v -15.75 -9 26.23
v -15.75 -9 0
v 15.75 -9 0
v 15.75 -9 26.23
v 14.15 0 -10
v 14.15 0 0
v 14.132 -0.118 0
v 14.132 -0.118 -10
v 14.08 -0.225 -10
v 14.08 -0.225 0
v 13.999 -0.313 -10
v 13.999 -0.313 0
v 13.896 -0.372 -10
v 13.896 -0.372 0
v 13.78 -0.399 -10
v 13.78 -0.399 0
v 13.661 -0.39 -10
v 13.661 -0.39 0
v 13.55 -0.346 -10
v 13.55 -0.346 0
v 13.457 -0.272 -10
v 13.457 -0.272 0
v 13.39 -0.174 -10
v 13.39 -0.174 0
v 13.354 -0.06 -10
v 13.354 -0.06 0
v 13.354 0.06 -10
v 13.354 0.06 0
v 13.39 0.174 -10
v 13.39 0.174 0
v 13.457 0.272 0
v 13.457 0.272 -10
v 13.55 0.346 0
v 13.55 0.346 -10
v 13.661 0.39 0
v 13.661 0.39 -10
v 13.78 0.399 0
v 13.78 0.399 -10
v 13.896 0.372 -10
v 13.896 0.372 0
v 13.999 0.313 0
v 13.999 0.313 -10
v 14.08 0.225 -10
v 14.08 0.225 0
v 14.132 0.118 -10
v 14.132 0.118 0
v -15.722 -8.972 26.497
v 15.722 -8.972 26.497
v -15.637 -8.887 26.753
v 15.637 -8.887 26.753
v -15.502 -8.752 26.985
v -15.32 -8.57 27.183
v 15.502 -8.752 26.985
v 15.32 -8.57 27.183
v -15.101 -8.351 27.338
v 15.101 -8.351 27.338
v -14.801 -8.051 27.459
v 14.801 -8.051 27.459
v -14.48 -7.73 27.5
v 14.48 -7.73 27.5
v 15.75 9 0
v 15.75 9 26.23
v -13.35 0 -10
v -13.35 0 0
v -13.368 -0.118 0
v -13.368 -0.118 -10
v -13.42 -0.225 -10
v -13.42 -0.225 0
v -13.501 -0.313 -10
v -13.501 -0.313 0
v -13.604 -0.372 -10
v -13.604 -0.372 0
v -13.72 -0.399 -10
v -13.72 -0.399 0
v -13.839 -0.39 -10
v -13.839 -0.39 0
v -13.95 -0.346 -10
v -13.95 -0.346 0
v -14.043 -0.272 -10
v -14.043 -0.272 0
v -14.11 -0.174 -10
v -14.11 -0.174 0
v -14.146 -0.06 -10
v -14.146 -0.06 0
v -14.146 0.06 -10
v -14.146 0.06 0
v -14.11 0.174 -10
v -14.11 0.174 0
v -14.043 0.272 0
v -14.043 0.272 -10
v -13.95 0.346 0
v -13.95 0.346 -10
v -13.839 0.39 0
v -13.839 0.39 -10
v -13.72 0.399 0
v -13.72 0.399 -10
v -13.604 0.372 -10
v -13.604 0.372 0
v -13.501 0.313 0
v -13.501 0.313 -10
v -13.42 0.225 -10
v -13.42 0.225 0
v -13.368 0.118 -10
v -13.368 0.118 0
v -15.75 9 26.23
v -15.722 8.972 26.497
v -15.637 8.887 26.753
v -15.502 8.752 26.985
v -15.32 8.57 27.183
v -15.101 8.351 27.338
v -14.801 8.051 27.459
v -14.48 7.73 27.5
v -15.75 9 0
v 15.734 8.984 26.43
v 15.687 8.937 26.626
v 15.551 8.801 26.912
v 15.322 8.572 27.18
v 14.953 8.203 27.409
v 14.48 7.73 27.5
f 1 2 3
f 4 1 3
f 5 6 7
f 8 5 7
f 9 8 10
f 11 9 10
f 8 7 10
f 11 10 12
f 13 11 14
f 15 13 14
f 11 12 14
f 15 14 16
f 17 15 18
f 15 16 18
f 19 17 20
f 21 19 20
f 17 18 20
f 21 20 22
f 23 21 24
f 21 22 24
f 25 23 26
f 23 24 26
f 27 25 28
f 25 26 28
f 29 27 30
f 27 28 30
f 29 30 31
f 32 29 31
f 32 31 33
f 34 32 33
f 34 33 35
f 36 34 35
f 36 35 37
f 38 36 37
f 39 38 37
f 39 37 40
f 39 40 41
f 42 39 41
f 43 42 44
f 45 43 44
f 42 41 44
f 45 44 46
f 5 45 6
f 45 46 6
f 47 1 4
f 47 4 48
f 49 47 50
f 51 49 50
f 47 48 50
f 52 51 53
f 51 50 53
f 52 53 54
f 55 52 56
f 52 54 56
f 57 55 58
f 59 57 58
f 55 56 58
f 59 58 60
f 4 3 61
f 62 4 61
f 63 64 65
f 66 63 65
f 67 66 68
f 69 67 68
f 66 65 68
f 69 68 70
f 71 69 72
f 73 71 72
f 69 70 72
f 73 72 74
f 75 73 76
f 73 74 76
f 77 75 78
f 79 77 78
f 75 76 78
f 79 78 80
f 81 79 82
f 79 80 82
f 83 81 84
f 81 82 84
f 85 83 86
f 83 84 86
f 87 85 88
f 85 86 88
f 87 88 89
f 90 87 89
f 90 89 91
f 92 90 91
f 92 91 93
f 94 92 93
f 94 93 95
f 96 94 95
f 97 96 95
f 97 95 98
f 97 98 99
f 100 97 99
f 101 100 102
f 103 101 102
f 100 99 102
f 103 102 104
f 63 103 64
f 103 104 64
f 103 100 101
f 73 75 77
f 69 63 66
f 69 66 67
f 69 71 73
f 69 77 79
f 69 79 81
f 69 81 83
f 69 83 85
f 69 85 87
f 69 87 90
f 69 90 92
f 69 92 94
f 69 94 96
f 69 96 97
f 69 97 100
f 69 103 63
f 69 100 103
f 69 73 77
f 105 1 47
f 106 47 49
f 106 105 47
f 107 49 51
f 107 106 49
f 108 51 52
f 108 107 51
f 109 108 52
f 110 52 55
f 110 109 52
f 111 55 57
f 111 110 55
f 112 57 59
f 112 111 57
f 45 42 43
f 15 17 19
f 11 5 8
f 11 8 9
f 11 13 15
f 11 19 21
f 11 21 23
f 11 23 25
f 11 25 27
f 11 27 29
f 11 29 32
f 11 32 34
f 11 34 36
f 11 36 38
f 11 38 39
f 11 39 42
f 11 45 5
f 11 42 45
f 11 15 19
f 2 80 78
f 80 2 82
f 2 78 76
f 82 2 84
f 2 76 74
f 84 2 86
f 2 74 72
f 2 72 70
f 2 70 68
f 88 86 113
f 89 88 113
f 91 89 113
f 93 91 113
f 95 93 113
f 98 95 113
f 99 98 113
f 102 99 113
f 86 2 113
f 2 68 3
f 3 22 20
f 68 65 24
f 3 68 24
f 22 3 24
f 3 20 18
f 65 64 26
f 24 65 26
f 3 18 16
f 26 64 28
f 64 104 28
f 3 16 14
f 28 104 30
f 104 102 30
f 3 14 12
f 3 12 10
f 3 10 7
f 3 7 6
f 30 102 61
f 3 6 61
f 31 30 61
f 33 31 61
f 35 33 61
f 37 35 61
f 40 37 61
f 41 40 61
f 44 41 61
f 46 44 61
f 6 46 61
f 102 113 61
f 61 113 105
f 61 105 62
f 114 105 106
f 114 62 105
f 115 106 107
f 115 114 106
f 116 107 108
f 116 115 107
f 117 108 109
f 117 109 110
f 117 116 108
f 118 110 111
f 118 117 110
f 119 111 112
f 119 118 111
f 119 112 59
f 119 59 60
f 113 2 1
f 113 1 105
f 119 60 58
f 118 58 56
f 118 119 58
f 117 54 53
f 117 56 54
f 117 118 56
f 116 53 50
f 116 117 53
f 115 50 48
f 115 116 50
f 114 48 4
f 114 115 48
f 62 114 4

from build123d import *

# Parameters (mm, degrees)
F0_W     = 31.5
F0_H     = 18
F0_R     = 0.4
F1_DEPTH = 27.5
F2_R     = 0.4
F3_DEPTH = 10
F4_R     = 1.27


with BuildPart() as f1:
    # F0 (on Top) → F1 (new body)
    with BuildSketch(Plane.XY):
        Rectangle(F0_W, F0_H)
        with Locations((-13.75, 0)):
            Circle(F0_R, mode=Mode.SUBTRACT)
        with Locations((13.75, 0)):
            Circle(F0_R, mode=Mode.SUBTRACT)
        with Locations((13.75, 0)):
            Circle(F0_R)
        with Locations((-13.75, 0)):
            Circle(F0_R)
    extrude(amount=F1_DEPTH)

    # F2 (on face) → F3 (join)
    with BuildSketch(Plane(origin=(0, 0, 0), x_dir=(1, 0, 0), z_dir=(0, 0, -1))):
        with Locations((13.75, 0)):
            Circle(F2_R)
        with Locations((-13.75, 0)):
            Circle(F2_R)
    extrude(amount=F3_DEPTH)

    # F4
    f4_edges = [f1.edges().sort_by_distance(p)[0] for p in [
        (-15.75, 0, 27.5),
        (0, -9, 27.5),
        (15.75, 0, 27.5),
        (0, 9, 27.5),
    ]]
    fillet(f4_edges, radius=F4_R)


solid = f1.part
